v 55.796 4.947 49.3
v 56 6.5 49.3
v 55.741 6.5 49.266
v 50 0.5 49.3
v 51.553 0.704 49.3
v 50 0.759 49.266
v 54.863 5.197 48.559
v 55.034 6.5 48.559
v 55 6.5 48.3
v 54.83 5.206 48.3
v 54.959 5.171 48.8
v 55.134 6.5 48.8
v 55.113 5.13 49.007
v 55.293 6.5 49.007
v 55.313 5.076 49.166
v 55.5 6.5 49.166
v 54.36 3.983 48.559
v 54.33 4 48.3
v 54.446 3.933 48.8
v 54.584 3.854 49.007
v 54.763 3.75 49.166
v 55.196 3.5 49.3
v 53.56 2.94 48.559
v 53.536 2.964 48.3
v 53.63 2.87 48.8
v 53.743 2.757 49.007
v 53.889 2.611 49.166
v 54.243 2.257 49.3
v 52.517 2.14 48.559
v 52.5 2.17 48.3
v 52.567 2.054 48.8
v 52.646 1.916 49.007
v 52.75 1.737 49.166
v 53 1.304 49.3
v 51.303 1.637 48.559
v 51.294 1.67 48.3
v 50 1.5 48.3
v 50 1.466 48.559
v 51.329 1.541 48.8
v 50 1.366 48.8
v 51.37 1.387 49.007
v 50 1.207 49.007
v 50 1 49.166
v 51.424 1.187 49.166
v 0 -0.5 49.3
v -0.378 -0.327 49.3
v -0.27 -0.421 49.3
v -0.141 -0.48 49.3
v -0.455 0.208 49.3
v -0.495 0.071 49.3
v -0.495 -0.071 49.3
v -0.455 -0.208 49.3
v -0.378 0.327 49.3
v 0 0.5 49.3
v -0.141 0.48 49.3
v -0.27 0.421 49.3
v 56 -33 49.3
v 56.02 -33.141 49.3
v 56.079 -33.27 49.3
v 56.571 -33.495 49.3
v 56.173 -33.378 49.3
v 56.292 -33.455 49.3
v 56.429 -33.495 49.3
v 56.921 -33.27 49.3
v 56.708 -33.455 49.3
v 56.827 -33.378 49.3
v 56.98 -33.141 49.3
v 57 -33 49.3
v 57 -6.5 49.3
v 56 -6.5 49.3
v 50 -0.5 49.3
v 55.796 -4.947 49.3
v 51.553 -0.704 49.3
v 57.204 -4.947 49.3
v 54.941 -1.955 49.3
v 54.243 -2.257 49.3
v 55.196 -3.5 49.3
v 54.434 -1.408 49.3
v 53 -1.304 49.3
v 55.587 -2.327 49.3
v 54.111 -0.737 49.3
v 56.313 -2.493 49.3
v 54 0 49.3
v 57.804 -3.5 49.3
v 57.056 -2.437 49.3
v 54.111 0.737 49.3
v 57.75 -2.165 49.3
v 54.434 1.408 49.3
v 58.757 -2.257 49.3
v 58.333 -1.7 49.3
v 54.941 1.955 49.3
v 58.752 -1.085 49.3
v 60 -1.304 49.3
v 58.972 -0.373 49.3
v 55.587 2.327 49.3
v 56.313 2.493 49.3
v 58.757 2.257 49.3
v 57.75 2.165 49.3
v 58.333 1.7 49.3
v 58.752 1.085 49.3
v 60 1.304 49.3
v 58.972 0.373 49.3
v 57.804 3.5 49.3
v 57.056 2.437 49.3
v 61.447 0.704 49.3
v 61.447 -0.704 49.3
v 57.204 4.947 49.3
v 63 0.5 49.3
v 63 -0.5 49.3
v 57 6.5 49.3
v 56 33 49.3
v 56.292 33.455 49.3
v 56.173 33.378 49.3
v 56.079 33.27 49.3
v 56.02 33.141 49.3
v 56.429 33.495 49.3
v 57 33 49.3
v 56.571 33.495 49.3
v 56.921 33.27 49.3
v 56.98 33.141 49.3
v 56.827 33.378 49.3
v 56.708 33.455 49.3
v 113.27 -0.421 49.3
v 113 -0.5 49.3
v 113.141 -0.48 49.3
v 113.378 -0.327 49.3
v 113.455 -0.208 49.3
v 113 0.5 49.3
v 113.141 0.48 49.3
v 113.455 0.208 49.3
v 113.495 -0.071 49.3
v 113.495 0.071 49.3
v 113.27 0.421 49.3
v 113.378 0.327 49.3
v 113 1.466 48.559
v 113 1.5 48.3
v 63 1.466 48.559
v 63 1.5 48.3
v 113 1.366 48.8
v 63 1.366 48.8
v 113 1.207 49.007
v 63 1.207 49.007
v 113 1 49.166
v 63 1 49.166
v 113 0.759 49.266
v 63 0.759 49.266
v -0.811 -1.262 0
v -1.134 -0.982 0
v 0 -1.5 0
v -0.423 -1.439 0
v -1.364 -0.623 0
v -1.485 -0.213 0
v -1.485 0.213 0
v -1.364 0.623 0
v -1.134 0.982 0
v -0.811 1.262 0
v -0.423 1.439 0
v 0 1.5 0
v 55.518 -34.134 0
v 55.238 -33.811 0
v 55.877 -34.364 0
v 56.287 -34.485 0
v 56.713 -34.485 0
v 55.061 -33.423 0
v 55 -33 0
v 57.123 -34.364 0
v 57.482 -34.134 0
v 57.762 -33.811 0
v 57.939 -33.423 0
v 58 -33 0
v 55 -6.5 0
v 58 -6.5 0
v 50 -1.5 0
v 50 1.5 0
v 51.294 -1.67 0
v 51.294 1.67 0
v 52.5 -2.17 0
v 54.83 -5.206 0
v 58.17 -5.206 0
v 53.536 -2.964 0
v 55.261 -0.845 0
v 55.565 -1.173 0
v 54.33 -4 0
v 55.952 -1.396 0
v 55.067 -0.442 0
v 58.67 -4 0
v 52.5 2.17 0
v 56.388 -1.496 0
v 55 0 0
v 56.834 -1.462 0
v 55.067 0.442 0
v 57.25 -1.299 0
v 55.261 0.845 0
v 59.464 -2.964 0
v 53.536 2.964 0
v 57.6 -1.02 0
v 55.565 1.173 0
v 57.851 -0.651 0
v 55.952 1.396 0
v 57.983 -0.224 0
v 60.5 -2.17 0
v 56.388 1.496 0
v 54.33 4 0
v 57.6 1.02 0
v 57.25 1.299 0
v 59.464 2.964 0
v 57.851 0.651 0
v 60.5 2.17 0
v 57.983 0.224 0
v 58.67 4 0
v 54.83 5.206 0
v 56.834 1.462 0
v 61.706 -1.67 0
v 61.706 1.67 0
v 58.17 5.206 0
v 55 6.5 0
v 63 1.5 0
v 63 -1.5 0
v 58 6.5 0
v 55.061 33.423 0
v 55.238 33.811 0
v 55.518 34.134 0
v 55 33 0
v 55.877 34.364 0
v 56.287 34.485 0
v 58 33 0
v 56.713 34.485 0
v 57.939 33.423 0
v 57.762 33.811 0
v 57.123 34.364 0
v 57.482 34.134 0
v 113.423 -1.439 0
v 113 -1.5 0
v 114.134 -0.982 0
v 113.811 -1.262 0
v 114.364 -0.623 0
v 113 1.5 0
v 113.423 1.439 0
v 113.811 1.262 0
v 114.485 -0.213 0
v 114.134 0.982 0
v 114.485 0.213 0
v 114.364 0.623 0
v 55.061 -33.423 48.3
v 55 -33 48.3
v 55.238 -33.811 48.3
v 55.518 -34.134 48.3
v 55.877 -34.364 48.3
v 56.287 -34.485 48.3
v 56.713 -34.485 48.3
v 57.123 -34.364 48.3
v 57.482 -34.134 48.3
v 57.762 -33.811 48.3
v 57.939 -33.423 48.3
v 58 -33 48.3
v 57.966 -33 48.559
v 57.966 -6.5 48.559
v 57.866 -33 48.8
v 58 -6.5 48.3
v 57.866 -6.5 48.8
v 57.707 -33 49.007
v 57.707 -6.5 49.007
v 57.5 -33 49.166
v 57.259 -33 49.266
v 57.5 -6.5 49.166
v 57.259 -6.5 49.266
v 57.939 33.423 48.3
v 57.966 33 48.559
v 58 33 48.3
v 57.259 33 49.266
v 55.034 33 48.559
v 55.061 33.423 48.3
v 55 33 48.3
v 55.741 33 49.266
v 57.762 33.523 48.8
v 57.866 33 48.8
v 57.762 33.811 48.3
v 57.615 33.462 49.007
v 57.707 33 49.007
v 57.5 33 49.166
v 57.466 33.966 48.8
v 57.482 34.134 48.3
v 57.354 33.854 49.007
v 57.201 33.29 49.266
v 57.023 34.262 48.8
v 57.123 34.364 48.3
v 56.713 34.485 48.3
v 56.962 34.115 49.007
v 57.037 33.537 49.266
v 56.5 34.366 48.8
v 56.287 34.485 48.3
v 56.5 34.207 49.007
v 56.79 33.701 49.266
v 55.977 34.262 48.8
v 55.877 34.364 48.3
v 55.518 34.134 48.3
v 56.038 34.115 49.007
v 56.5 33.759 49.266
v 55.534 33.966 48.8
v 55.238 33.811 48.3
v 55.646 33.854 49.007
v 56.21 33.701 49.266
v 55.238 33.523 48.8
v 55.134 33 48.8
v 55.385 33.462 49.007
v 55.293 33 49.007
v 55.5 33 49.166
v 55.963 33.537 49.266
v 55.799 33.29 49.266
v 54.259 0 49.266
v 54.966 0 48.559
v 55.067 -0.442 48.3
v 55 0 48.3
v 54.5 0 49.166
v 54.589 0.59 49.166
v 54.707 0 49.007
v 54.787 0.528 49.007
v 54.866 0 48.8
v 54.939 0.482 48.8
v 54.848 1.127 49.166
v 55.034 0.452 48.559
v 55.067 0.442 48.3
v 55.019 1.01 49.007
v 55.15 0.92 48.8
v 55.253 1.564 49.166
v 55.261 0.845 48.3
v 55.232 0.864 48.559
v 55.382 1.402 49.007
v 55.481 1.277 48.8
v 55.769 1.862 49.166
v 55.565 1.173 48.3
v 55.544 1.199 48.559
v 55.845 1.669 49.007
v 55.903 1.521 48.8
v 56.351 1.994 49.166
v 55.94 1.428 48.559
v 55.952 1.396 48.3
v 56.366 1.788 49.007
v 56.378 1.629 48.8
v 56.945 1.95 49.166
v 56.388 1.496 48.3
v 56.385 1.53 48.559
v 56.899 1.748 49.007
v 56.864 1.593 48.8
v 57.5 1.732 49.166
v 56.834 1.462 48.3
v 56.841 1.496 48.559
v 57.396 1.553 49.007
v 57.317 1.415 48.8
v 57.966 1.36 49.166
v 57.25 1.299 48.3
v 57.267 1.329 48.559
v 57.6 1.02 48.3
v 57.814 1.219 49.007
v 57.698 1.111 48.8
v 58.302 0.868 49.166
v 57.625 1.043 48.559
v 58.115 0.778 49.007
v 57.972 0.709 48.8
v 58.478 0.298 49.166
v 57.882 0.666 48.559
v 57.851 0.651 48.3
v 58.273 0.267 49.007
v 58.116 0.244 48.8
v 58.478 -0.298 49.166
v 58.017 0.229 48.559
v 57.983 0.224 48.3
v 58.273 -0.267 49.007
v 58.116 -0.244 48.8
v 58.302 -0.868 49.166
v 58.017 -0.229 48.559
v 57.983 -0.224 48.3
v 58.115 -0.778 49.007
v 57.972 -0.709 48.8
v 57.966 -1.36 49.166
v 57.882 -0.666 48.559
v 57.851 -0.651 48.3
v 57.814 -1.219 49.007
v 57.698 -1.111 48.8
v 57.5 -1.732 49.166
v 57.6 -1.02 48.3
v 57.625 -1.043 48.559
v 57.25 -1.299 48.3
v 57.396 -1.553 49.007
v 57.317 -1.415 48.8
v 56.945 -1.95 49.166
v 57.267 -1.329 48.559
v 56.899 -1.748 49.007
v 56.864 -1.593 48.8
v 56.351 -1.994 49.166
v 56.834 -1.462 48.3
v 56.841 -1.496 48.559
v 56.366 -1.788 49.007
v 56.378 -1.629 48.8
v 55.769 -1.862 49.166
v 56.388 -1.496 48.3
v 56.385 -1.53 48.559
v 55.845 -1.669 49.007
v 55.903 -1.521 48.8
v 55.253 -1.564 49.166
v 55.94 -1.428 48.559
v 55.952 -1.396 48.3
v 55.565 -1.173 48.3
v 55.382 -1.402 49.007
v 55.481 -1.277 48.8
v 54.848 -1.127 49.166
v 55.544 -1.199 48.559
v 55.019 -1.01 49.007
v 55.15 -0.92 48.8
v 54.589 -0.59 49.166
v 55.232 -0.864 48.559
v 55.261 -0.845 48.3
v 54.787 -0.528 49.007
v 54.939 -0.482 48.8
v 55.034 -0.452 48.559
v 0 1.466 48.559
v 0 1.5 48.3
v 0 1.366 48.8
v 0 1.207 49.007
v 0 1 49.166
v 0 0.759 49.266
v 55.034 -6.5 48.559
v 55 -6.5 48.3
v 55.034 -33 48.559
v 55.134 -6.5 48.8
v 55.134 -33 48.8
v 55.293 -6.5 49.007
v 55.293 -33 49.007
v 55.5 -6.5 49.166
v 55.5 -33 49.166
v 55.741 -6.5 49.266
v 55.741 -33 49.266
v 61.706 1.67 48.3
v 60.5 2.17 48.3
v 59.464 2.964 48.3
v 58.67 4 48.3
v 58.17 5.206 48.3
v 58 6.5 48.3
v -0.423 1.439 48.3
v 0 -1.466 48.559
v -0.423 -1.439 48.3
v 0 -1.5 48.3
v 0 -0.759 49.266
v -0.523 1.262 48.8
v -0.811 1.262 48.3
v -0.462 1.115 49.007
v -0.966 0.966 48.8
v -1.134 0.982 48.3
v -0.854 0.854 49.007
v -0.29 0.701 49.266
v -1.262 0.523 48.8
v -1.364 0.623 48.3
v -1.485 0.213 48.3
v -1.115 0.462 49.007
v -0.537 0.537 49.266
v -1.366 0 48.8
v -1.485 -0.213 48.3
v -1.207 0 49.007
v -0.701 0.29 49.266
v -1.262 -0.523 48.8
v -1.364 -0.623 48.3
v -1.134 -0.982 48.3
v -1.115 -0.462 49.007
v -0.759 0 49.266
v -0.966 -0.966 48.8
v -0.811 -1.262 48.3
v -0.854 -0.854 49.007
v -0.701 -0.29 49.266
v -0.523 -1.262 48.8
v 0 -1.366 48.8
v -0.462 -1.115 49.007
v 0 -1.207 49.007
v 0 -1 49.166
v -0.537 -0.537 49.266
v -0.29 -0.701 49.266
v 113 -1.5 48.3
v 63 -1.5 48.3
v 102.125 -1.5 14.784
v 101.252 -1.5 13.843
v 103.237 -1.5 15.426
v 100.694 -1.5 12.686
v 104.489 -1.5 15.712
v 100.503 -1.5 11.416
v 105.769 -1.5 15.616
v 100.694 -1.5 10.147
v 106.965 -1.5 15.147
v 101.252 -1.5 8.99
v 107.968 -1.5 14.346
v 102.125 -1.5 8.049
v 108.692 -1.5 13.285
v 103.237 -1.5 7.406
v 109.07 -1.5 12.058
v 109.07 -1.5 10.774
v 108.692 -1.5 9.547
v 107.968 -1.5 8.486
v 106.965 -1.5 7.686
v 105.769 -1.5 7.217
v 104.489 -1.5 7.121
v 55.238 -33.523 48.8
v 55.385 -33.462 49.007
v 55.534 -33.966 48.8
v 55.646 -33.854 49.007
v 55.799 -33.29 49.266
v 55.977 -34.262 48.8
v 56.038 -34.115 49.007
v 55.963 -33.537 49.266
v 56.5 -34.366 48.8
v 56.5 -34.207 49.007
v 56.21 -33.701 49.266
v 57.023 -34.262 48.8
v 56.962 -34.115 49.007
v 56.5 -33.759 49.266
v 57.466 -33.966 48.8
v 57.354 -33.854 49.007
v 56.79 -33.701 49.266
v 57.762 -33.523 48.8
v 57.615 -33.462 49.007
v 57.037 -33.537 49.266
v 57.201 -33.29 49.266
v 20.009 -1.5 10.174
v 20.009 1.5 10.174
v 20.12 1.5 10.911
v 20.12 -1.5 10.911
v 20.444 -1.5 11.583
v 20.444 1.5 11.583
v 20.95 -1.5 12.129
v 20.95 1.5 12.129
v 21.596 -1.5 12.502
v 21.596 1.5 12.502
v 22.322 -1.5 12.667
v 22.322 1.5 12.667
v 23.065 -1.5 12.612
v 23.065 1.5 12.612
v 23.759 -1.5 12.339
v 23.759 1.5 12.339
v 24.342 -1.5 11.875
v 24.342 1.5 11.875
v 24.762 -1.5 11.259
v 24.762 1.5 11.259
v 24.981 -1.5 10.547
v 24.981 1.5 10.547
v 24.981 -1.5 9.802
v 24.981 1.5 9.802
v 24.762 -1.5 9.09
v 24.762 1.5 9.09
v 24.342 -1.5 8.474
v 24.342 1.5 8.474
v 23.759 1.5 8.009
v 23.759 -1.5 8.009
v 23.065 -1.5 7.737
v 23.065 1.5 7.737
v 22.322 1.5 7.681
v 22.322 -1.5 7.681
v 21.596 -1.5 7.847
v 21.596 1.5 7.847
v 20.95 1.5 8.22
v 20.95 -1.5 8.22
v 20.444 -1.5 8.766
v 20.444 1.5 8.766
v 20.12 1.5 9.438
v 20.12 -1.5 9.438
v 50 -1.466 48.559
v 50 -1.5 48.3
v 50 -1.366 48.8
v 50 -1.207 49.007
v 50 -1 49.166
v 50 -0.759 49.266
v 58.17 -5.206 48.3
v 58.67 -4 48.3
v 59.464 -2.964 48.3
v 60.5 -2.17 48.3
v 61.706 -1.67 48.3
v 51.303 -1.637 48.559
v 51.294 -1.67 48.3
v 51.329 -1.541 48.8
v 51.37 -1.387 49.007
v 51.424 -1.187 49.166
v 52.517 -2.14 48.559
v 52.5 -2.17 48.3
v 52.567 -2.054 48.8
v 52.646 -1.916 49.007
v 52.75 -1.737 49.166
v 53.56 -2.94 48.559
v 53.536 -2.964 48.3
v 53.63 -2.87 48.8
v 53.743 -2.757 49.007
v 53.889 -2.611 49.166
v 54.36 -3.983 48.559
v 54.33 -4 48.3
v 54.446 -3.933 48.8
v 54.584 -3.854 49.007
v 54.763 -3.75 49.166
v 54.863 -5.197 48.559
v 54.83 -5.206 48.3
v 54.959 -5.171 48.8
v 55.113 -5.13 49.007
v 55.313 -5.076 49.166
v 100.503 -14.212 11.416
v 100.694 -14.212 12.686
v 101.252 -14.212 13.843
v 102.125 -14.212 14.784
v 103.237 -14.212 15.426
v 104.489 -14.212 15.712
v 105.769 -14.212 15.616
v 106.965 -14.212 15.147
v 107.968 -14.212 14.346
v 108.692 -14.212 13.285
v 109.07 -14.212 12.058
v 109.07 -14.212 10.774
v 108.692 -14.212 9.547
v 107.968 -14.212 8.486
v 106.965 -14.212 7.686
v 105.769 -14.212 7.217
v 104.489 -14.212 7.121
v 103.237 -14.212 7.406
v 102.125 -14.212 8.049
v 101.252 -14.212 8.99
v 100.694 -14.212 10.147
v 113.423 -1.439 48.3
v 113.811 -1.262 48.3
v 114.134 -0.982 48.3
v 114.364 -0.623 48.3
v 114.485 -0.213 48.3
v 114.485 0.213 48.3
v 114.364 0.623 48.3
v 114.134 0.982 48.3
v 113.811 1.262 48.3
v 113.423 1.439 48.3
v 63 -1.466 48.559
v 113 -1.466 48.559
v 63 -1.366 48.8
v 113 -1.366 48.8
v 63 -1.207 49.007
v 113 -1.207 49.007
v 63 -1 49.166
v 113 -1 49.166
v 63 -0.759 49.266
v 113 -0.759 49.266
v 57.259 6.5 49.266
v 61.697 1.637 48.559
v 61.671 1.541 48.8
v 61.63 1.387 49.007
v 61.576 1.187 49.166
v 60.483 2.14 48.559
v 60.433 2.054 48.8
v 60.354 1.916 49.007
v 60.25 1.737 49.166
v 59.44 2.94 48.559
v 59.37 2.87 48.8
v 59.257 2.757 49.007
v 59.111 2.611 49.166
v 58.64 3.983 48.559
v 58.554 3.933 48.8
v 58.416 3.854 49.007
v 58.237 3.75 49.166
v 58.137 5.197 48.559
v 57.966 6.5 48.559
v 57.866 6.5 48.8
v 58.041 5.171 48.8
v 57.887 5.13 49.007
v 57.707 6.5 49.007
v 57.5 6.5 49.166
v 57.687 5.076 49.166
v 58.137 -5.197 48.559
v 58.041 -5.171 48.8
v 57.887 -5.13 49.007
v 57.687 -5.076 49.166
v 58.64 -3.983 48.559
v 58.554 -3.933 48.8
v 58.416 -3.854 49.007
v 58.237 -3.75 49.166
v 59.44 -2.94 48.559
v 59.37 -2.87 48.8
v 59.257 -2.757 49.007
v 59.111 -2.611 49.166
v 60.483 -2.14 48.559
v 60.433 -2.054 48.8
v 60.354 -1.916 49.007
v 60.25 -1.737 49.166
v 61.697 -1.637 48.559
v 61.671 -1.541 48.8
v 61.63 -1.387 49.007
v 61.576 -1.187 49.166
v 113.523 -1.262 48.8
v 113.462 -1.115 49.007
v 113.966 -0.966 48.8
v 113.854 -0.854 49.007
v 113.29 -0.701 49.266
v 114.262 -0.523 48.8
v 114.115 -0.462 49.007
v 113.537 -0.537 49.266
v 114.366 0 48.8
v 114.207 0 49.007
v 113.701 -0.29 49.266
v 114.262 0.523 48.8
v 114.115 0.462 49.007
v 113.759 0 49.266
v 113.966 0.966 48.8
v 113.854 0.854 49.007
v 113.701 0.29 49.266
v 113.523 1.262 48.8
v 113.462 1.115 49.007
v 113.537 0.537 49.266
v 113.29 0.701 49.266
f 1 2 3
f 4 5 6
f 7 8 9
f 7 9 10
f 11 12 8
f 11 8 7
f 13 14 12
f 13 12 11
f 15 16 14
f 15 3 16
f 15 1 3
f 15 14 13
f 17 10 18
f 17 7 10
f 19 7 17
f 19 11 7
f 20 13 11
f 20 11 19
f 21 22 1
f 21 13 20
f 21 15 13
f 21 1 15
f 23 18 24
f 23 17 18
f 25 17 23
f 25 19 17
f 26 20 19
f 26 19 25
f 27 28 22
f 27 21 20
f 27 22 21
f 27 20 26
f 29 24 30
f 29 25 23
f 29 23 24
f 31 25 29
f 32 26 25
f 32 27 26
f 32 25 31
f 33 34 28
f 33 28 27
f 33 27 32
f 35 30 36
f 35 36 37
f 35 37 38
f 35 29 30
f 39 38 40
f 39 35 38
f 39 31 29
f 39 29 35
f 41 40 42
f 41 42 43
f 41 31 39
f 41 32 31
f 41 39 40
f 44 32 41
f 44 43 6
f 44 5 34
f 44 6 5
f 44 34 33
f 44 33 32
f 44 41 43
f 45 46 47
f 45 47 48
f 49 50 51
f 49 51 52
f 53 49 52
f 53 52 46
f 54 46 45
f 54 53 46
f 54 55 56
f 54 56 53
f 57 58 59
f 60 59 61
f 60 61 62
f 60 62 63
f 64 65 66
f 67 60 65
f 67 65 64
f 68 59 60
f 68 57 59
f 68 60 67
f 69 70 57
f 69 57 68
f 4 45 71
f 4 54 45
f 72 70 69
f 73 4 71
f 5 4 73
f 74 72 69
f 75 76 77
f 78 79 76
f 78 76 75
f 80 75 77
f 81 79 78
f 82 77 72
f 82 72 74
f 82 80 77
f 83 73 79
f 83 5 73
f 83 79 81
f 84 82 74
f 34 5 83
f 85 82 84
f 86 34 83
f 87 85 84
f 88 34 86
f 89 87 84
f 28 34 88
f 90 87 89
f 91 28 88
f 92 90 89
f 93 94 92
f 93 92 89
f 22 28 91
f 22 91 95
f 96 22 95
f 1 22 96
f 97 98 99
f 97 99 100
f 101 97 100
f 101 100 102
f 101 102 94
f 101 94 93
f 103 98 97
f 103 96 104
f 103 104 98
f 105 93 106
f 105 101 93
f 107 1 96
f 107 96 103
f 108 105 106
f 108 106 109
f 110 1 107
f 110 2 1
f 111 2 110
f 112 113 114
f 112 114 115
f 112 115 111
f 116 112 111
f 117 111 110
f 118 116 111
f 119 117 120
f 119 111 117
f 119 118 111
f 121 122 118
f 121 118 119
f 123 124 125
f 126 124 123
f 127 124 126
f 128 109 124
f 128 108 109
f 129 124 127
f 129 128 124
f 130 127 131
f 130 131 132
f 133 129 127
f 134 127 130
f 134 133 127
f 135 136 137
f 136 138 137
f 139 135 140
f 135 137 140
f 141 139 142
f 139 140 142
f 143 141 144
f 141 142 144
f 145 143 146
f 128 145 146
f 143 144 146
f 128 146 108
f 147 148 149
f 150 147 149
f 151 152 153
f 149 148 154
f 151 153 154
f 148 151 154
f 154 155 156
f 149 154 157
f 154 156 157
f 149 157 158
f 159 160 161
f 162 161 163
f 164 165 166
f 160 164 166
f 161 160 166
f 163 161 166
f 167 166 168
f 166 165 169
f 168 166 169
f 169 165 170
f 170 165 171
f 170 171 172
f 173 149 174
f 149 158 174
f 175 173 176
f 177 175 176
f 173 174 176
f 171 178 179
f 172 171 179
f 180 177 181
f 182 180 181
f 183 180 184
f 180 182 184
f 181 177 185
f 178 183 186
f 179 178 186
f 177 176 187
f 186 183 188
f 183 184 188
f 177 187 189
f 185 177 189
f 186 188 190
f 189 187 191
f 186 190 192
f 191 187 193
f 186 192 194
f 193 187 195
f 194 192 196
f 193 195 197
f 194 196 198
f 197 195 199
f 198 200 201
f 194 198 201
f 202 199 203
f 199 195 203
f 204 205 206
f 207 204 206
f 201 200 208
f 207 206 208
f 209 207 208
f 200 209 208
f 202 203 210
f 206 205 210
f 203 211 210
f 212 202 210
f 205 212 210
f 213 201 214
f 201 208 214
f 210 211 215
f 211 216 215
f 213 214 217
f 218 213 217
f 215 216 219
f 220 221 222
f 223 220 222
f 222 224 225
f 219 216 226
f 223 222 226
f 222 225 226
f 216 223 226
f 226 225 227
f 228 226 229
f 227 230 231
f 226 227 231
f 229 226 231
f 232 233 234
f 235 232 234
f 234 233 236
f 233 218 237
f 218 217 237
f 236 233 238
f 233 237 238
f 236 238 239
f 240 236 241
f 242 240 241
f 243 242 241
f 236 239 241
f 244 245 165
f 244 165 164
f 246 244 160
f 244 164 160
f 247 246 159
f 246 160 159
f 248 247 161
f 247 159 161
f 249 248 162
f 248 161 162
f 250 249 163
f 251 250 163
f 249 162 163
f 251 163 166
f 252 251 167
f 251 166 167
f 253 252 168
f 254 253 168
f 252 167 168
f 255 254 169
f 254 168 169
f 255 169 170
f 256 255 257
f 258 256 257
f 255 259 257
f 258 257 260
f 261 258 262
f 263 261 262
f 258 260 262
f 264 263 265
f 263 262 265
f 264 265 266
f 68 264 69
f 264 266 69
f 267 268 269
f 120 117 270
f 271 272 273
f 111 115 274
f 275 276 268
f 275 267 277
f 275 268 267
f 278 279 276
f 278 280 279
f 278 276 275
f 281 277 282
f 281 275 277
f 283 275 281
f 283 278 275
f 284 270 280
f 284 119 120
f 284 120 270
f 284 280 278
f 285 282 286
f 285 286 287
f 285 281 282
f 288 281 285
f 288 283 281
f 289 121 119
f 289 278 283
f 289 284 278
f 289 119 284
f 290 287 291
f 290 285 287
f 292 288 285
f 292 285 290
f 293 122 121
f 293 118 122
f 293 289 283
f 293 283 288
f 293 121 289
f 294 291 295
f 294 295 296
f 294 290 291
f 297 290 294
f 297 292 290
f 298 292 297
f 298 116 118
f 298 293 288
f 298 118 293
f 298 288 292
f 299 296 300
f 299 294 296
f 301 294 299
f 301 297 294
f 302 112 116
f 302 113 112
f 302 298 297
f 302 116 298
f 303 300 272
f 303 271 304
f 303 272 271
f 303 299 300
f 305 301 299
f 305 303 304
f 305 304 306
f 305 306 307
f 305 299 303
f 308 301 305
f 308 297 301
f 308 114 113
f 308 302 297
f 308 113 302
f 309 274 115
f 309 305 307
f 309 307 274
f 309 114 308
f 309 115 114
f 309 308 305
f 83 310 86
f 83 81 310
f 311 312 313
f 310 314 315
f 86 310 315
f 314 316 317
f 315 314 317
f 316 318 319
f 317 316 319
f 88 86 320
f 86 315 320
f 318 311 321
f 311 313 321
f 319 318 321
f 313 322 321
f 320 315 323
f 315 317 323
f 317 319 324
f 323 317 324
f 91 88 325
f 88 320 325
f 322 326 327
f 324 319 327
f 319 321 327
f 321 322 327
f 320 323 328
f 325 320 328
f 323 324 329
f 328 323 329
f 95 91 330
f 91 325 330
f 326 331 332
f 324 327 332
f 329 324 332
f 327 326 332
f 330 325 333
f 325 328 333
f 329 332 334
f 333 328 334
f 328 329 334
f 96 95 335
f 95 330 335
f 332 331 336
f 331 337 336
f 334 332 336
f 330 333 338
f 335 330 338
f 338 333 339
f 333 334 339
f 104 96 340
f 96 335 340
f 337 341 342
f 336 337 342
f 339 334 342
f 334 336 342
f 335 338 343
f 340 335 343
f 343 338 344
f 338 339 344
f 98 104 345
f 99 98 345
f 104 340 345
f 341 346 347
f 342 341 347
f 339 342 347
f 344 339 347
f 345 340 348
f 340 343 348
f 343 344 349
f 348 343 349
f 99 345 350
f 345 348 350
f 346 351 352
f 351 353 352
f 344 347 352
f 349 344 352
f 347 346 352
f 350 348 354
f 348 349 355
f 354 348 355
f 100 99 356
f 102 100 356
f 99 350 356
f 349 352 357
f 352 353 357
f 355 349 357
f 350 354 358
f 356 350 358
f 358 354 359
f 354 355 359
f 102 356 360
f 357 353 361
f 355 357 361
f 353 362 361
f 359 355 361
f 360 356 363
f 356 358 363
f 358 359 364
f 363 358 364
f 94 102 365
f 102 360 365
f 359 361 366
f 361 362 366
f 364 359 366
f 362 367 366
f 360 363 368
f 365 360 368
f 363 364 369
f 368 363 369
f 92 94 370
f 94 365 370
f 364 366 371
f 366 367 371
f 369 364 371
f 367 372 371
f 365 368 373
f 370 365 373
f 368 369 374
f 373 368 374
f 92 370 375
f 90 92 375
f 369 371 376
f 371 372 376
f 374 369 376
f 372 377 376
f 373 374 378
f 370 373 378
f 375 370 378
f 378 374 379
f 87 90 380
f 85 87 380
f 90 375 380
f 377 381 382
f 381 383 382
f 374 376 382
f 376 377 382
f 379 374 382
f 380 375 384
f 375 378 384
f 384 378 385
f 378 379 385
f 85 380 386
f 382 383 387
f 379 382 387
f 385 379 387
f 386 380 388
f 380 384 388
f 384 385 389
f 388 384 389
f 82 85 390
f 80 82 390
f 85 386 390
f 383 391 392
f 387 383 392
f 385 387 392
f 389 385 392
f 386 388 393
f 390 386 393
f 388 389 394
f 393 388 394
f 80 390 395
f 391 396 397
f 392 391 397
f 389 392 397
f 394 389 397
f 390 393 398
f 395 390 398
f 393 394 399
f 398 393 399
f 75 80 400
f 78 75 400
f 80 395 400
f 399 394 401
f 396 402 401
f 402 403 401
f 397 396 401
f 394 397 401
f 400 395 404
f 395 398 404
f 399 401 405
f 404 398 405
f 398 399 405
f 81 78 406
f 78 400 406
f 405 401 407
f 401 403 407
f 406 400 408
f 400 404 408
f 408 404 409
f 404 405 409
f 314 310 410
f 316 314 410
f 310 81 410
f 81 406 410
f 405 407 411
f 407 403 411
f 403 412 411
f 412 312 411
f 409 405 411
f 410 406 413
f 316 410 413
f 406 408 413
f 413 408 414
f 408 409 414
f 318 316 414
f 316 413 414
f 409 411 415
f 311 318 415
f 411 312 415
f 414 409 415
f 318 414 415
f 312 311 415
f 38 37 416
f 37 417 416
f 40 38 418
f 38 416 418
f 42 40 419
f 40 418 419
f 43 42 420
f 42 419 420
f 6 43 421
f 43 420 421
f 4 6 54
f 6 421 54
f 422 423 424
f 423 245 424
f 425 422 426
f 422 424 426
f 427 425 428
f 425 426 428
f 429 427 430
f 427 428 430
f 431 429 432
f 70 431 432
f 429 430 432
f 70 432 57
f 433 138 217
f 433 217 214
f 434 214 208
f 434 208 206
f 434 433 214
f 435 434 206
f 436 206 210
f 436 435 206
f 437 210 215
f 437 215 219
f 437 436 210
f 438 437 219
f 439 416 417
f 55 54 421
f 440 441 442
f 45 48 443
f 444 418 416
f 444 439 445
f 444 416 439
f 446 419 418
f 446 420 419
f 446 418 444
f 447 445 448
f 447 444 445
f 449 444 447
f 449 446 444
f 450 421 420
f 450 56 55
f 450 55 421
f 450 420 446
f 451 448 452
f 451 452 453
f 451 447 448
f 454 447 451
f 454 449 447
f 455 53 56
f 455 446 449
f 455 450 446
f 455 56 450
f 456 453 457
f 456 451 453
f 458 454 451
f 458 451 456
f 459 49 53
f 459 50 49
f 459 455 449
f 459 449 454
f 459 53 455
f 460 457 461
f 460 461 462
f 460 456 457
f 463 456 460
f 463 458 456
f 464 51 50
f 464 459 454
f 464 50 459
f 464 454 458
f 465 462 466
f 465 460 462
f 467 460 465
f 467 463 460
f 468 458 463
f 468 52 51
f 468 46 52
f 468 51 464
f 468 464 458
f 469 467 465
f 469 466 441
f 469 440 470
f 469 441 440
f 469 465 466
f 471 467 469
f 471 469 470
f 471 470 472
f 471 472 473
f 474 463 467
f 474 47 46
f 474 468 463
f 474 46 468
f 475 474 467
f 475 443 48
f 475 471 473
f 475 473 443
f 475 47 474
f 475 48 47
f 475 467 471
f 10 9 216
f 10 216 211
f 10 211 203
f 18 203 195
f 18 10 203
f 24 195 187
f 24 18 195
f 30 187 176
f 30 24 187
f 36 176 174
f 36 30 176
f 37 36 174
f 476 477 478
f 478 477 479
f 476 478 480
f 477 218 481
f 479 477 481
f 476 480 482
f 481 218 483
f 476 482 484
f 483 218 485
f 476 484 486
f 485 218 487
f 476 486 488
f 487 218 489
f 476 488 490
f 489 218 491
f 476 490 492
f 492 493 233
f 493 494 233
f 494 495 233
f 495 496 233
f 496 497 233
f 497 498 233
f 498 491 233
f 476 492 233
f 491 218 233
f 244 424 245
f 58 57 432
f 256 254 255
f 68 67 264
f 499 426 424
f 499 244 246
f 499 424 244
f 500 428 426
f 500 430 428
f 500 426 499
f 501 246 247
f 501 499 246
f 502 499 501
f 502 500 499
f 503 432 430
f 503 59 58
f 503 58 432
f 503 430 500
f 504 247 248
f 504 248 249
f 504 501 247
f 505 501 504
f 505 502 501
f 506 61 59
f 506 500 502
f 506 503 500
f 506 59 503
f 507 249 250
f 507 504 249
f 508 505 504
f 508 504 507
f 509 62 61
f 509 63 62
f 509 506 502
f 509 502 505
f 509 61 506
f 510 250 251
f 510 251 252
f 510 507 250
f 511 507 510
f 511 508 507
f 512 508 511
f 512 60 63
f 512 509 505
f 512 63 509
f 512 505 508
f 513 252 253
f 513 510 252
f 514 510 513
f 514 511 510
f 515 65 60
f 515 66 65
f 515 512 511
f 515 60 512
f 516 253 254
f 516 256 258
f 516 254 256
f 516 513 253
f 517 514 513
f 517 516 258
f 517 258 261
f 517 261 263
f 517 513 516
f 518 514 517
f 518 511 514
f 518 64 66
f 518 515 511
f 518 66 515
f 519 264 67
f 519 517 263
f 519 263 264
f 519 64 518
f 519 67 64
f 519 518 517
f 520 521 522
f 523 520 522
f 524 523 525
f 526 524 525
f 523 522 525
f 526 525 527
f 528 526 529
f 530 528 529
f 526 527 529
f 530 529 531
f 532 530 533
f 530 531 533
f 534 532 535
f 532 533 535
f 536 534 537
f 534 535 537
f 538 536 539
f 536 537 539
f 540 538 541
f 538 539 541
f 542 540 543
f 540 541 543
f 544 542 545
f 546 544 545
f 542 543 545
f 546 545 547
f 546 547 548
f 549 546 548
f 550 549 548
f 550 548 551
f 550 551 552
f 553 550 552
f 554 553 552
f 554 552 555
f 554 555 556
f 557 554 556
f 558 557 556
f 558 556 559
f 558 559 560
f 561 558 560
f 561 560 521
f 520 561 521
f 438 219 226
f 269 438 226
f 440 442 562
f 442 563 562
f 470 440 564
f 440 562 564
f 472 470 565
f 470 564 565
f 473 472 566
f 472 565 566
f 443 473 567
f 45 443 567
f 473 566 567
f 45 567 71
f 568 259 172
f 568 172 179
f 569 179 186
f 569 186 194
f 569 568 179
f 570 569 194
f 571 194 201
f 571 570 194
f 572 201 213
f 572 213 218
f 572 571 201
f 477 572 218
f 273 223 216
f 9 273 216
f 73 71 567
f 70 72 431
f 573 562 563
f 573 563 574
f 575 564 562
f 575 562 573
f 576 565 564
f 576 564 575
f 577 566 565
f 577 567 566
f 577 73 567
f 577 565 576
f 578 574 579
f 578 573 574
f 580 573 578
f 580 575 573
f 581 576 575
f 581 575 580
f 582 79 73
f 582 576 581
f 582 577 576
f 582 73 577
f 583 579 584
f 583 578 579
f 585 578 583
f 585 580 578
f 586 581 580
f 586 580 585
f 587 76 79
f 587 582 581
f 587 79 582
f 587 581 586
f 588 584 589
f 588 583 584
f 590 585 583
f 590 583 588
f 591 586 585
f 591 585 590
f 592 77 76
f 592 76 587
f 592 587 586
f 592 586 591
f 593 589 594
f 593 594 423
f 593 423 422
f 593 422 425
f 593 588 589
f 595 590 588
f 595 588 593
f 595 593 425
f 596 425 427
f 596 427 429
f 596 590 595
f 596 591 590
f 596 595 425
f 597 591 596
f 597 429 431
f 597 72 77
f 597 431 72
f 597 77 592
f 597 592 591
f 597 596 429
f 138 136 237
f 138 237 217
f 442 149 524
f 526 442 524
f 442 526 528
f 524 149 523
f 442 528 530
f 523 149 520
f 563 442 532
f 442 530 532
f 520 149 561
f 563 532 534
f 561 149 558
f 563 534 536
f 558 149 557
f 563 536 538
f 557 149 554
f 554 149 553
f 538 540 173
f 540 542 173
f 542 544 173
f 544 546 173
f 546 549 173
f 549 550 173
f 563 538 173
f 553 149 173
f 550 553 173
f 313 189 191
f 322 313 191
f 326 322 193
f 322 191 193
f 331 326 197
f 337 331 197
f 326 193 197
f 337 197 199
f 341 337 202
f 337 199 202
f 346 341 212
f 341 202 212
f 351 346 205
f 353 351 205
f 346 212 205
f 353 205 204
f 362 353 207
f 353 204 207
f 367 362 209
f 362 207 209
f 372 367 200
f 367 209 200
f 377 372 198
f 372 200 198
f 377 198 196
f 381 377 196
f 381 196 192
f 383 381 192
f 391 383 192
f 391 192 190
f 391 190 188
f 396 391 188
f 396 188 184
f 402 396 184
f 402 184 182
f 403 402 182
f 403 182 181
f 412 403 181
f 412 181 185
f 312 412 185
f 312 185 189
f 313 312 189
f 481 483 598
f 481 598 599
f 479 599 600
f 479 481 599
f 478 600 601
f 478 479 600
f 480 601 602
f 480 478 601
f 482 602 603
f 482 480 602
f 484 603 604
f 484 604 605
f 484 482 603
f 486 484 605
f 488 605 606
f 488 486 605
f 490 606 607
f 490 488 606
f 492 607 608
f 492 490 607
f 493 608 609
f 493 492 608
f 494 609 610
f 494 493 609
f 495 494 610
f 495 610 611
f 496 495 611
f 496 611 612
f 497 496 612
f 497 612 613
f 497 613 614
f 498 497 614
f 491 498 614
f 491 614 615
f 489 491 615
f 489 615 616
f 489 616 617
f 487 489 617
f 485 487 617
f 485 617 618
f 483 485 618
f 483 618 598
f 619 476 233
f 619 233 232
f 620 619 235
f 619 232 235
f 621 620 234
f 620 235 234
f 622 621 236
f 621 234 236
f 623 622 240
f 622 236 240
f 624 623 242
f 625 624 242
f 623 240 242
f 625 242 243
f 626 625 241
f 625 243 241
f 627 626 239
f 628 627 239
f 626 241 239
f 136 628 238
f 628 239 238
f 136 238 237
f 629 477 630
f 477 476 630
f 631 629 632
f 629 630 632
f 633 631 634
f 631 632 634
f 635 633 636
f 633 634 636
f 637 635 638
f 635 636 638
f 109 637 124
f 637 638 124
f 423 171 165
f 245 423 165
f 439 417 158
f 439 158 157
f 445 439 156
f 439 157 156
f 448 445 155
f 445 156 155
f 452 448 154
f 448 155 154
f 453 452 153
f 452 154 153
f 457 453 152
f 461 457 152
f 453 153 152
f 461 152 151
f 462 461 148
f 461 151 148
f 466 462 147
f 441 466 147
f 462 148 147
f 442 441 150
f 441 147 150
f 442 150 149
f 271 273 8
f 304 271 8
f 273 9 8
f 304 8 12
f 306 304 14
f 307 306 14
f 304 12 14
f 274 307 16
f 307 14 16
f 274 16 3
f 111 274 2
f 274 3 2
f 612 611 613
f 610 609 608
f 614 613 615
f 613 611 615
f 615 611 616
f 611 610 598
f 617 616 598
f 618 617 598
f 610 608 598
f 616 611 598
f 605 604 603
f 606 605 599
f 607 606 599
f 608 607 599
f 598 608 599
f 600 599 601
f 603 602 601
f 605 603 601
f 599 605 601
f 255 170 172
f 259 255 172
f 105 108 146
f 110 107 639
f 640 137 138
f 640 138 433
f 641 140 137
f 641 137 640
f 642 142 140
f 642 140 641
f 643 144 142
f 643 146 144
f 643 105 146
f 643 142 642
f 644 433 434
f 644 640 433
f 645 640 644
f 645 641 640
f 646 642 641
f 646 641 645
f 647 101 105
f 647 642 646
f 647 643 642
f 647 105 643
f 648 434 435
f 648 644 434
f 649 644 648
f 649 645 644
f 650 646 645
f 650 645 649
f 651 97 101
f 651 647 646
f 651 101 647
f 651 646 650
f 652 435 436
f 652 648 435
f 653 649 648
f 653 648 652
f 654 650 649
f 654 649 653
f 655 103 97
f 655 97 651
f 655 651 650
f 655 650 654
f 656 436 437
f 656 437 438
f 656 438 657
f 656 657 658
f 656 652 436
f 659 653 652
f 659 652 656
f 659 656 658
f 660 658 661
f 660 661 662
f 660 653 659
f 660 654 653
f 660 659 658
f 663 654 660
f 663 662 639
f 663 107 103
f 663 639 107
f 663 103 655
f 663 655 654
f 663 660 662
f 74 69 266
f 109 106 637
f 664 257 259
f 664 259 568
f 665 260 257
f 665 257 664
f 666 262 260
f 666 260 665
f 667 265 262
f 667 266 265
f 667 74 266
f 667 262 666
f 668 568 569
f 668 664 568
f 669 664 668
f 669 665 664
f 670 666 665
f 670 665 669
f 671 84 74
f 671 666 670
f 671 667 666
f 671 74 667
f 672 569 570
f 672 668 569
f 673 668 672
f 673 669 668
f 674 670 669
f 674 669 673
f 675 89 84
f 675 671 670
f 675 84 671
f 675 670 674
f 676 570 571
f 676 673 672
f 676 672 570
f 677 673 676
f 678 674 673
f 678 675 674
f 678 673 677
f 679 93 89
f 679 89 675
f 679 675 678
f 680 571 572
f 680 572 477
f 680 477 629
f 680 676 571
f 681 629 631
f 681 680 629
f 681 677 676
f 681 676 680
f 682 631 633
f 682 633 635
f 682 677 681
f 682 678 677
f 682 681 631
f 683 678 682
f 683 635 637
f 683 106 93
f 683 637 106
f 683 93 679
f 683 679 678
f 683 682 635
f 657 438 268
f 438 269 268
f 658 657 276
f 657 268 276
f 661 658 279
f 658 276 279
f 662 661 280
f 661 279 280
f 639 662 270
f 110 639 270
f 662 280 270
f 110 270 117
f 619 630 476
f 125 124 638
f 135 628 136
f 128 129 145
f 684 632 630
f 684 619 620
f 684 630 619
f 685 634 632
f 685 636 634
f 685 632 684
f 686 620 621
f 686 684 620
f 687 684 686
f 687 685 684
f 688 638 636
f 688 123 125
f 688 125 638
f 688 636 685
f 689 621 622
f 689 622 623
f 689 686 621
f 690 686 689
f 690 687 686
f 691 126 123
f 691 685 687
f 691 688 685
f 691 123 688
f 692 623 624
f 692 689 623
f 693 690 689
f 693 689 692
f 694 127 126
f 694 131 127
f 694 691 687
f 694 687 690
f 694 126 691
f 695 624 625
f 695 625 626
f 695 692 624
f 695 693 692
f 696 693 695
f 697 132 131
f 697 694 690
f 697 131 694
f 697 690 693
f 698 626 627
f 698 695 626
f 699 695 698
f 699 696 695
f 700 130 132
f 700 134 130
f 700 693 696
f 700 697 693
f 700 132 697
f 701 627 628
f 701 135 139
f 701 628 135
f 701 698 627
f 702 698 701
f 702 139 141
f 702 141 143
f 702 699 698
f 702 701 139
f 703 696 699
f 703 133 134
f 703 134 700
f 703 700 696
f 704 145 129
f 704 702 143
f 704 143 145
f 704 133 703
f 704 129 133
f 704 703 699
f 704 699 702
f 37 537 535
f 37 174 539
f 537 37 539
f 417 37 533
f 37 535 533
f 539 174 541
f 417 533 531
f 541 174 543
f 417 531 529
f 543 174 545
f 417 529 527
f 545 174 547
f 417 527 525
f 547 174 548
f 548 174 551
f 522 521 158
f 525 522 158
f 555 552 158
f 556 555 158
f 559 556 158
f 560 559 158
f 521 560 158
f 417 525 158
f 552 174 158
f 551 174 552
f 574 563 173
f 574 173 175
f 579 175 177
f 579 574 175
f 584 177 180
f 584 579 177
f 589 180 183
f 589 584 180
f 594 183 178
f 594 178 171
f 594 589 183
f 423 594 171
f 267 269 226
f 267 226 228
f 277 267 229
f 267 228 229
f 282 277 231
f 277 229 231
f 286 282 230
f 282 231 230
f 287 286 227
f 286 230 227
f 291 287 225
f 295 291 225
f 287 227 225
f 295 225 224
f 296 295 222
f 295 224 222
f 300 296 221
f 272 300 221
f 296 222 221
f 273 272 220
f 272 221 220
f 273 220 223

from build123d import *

# Parameters (mm, degrees)
F1_DEPTH = 49.3
F2_R     = 5
F4_D     = 3
F5_R     = 1
F6_R     = 4.3076910369
F7_DEPTH = 15.71207
F8_D     = 5


with BuildPart() as f1:
    # F0 (on Top) → F1 (new body)
    with BuildSketch(Plane.XY):
        with BuildLine():
            ThreePointArc((0, 1.5), (-1.5, 0), (0, -1.5))
            Line((0, -1.5), (55, -1.5))
            Line((55, -1.5), (55, -33))
            ThreePointArc((55, -33), (56.5, -34.5), (58, -33))
            Line((58, -33), (58, -1.5))
            Line((58, -1.5), (113, -1.5))
            ThreePointArc((113, -1.5), (114.5, 0), (113, 1.5))
            Line((113, 1.5), (58, 1.5))
            Line((58, 1.5), (58, 33))
            ThreePointArc((58, 33), (56.5, 34.5), (55, 33))
            Line((55, 33), (55, 1.5))
            Line((55, 1.5), (0, 1.5))
        make_face()
    extrude(amount=F1_DEPTH)

    # F2
    f2_edges = [f1.edges().sort_by_distance(p)[0] for p in [
        (58, -1.5, 24.65),
        (55, -1.5, 24.65),
        (55, 1.5, 24.65),
        (58, 1.5, 24.65),
    ]]
    fillet(f2_edges, radius=F2_R)

    # F4 (through all)
    with Locations(Plane.XY.offset(49.3)):
        with Locations((56.5, 0)):
            Hole(F4_D / 2)

    # F5
    f5_edges = [f1.edges().sort_by_distance(p)[0] for p in [
        (25, -1.5, 49.3),
        (53.535534, -2.964466, 49.3),
        (-1.5, 0, 49.3),
        (55, -19.75, 49.3),
        (25, 1.5, 49.3),
        (56.5, -34.5, 49.3),
        (53.535534, 2.964466, 49.3),
        (58, -19.75, 49.3),
        (55, 19.75, 49.3),
        (59.464466, -2.964466, 49.3),
        (56.5, 34.5, 49.3),
        (88, -1.5, 49.3),
        (58, 19.75, 49.3),
        (114.5, 0, 49.3),
        (59.464466, 2.964466, 49.3),
        (88, 1.5, 49.3),
        (55, 0, 49.3),
    ]]
    fillet(f5_edges, radius=F5_R)

    # F6 (on face) → F7 (join)
    with BuildSketch(Plane(origin=(0, 1.5, 0), x_dir=(-1, 0, 0), z_dir=(0, 1, 0))):
        with Locations((-104.8107147217, 11.4163886756)):
            Circle(F6_R)
    extrude(amount=-F7_DEPTH)

    # F8 (through all)
    with Locations(Plane.XZ.offset(1.5)):
        with Locations((22.5091800094, 10.1744234562)):
            Hole(F8_D / 2)


solid = f1.part
